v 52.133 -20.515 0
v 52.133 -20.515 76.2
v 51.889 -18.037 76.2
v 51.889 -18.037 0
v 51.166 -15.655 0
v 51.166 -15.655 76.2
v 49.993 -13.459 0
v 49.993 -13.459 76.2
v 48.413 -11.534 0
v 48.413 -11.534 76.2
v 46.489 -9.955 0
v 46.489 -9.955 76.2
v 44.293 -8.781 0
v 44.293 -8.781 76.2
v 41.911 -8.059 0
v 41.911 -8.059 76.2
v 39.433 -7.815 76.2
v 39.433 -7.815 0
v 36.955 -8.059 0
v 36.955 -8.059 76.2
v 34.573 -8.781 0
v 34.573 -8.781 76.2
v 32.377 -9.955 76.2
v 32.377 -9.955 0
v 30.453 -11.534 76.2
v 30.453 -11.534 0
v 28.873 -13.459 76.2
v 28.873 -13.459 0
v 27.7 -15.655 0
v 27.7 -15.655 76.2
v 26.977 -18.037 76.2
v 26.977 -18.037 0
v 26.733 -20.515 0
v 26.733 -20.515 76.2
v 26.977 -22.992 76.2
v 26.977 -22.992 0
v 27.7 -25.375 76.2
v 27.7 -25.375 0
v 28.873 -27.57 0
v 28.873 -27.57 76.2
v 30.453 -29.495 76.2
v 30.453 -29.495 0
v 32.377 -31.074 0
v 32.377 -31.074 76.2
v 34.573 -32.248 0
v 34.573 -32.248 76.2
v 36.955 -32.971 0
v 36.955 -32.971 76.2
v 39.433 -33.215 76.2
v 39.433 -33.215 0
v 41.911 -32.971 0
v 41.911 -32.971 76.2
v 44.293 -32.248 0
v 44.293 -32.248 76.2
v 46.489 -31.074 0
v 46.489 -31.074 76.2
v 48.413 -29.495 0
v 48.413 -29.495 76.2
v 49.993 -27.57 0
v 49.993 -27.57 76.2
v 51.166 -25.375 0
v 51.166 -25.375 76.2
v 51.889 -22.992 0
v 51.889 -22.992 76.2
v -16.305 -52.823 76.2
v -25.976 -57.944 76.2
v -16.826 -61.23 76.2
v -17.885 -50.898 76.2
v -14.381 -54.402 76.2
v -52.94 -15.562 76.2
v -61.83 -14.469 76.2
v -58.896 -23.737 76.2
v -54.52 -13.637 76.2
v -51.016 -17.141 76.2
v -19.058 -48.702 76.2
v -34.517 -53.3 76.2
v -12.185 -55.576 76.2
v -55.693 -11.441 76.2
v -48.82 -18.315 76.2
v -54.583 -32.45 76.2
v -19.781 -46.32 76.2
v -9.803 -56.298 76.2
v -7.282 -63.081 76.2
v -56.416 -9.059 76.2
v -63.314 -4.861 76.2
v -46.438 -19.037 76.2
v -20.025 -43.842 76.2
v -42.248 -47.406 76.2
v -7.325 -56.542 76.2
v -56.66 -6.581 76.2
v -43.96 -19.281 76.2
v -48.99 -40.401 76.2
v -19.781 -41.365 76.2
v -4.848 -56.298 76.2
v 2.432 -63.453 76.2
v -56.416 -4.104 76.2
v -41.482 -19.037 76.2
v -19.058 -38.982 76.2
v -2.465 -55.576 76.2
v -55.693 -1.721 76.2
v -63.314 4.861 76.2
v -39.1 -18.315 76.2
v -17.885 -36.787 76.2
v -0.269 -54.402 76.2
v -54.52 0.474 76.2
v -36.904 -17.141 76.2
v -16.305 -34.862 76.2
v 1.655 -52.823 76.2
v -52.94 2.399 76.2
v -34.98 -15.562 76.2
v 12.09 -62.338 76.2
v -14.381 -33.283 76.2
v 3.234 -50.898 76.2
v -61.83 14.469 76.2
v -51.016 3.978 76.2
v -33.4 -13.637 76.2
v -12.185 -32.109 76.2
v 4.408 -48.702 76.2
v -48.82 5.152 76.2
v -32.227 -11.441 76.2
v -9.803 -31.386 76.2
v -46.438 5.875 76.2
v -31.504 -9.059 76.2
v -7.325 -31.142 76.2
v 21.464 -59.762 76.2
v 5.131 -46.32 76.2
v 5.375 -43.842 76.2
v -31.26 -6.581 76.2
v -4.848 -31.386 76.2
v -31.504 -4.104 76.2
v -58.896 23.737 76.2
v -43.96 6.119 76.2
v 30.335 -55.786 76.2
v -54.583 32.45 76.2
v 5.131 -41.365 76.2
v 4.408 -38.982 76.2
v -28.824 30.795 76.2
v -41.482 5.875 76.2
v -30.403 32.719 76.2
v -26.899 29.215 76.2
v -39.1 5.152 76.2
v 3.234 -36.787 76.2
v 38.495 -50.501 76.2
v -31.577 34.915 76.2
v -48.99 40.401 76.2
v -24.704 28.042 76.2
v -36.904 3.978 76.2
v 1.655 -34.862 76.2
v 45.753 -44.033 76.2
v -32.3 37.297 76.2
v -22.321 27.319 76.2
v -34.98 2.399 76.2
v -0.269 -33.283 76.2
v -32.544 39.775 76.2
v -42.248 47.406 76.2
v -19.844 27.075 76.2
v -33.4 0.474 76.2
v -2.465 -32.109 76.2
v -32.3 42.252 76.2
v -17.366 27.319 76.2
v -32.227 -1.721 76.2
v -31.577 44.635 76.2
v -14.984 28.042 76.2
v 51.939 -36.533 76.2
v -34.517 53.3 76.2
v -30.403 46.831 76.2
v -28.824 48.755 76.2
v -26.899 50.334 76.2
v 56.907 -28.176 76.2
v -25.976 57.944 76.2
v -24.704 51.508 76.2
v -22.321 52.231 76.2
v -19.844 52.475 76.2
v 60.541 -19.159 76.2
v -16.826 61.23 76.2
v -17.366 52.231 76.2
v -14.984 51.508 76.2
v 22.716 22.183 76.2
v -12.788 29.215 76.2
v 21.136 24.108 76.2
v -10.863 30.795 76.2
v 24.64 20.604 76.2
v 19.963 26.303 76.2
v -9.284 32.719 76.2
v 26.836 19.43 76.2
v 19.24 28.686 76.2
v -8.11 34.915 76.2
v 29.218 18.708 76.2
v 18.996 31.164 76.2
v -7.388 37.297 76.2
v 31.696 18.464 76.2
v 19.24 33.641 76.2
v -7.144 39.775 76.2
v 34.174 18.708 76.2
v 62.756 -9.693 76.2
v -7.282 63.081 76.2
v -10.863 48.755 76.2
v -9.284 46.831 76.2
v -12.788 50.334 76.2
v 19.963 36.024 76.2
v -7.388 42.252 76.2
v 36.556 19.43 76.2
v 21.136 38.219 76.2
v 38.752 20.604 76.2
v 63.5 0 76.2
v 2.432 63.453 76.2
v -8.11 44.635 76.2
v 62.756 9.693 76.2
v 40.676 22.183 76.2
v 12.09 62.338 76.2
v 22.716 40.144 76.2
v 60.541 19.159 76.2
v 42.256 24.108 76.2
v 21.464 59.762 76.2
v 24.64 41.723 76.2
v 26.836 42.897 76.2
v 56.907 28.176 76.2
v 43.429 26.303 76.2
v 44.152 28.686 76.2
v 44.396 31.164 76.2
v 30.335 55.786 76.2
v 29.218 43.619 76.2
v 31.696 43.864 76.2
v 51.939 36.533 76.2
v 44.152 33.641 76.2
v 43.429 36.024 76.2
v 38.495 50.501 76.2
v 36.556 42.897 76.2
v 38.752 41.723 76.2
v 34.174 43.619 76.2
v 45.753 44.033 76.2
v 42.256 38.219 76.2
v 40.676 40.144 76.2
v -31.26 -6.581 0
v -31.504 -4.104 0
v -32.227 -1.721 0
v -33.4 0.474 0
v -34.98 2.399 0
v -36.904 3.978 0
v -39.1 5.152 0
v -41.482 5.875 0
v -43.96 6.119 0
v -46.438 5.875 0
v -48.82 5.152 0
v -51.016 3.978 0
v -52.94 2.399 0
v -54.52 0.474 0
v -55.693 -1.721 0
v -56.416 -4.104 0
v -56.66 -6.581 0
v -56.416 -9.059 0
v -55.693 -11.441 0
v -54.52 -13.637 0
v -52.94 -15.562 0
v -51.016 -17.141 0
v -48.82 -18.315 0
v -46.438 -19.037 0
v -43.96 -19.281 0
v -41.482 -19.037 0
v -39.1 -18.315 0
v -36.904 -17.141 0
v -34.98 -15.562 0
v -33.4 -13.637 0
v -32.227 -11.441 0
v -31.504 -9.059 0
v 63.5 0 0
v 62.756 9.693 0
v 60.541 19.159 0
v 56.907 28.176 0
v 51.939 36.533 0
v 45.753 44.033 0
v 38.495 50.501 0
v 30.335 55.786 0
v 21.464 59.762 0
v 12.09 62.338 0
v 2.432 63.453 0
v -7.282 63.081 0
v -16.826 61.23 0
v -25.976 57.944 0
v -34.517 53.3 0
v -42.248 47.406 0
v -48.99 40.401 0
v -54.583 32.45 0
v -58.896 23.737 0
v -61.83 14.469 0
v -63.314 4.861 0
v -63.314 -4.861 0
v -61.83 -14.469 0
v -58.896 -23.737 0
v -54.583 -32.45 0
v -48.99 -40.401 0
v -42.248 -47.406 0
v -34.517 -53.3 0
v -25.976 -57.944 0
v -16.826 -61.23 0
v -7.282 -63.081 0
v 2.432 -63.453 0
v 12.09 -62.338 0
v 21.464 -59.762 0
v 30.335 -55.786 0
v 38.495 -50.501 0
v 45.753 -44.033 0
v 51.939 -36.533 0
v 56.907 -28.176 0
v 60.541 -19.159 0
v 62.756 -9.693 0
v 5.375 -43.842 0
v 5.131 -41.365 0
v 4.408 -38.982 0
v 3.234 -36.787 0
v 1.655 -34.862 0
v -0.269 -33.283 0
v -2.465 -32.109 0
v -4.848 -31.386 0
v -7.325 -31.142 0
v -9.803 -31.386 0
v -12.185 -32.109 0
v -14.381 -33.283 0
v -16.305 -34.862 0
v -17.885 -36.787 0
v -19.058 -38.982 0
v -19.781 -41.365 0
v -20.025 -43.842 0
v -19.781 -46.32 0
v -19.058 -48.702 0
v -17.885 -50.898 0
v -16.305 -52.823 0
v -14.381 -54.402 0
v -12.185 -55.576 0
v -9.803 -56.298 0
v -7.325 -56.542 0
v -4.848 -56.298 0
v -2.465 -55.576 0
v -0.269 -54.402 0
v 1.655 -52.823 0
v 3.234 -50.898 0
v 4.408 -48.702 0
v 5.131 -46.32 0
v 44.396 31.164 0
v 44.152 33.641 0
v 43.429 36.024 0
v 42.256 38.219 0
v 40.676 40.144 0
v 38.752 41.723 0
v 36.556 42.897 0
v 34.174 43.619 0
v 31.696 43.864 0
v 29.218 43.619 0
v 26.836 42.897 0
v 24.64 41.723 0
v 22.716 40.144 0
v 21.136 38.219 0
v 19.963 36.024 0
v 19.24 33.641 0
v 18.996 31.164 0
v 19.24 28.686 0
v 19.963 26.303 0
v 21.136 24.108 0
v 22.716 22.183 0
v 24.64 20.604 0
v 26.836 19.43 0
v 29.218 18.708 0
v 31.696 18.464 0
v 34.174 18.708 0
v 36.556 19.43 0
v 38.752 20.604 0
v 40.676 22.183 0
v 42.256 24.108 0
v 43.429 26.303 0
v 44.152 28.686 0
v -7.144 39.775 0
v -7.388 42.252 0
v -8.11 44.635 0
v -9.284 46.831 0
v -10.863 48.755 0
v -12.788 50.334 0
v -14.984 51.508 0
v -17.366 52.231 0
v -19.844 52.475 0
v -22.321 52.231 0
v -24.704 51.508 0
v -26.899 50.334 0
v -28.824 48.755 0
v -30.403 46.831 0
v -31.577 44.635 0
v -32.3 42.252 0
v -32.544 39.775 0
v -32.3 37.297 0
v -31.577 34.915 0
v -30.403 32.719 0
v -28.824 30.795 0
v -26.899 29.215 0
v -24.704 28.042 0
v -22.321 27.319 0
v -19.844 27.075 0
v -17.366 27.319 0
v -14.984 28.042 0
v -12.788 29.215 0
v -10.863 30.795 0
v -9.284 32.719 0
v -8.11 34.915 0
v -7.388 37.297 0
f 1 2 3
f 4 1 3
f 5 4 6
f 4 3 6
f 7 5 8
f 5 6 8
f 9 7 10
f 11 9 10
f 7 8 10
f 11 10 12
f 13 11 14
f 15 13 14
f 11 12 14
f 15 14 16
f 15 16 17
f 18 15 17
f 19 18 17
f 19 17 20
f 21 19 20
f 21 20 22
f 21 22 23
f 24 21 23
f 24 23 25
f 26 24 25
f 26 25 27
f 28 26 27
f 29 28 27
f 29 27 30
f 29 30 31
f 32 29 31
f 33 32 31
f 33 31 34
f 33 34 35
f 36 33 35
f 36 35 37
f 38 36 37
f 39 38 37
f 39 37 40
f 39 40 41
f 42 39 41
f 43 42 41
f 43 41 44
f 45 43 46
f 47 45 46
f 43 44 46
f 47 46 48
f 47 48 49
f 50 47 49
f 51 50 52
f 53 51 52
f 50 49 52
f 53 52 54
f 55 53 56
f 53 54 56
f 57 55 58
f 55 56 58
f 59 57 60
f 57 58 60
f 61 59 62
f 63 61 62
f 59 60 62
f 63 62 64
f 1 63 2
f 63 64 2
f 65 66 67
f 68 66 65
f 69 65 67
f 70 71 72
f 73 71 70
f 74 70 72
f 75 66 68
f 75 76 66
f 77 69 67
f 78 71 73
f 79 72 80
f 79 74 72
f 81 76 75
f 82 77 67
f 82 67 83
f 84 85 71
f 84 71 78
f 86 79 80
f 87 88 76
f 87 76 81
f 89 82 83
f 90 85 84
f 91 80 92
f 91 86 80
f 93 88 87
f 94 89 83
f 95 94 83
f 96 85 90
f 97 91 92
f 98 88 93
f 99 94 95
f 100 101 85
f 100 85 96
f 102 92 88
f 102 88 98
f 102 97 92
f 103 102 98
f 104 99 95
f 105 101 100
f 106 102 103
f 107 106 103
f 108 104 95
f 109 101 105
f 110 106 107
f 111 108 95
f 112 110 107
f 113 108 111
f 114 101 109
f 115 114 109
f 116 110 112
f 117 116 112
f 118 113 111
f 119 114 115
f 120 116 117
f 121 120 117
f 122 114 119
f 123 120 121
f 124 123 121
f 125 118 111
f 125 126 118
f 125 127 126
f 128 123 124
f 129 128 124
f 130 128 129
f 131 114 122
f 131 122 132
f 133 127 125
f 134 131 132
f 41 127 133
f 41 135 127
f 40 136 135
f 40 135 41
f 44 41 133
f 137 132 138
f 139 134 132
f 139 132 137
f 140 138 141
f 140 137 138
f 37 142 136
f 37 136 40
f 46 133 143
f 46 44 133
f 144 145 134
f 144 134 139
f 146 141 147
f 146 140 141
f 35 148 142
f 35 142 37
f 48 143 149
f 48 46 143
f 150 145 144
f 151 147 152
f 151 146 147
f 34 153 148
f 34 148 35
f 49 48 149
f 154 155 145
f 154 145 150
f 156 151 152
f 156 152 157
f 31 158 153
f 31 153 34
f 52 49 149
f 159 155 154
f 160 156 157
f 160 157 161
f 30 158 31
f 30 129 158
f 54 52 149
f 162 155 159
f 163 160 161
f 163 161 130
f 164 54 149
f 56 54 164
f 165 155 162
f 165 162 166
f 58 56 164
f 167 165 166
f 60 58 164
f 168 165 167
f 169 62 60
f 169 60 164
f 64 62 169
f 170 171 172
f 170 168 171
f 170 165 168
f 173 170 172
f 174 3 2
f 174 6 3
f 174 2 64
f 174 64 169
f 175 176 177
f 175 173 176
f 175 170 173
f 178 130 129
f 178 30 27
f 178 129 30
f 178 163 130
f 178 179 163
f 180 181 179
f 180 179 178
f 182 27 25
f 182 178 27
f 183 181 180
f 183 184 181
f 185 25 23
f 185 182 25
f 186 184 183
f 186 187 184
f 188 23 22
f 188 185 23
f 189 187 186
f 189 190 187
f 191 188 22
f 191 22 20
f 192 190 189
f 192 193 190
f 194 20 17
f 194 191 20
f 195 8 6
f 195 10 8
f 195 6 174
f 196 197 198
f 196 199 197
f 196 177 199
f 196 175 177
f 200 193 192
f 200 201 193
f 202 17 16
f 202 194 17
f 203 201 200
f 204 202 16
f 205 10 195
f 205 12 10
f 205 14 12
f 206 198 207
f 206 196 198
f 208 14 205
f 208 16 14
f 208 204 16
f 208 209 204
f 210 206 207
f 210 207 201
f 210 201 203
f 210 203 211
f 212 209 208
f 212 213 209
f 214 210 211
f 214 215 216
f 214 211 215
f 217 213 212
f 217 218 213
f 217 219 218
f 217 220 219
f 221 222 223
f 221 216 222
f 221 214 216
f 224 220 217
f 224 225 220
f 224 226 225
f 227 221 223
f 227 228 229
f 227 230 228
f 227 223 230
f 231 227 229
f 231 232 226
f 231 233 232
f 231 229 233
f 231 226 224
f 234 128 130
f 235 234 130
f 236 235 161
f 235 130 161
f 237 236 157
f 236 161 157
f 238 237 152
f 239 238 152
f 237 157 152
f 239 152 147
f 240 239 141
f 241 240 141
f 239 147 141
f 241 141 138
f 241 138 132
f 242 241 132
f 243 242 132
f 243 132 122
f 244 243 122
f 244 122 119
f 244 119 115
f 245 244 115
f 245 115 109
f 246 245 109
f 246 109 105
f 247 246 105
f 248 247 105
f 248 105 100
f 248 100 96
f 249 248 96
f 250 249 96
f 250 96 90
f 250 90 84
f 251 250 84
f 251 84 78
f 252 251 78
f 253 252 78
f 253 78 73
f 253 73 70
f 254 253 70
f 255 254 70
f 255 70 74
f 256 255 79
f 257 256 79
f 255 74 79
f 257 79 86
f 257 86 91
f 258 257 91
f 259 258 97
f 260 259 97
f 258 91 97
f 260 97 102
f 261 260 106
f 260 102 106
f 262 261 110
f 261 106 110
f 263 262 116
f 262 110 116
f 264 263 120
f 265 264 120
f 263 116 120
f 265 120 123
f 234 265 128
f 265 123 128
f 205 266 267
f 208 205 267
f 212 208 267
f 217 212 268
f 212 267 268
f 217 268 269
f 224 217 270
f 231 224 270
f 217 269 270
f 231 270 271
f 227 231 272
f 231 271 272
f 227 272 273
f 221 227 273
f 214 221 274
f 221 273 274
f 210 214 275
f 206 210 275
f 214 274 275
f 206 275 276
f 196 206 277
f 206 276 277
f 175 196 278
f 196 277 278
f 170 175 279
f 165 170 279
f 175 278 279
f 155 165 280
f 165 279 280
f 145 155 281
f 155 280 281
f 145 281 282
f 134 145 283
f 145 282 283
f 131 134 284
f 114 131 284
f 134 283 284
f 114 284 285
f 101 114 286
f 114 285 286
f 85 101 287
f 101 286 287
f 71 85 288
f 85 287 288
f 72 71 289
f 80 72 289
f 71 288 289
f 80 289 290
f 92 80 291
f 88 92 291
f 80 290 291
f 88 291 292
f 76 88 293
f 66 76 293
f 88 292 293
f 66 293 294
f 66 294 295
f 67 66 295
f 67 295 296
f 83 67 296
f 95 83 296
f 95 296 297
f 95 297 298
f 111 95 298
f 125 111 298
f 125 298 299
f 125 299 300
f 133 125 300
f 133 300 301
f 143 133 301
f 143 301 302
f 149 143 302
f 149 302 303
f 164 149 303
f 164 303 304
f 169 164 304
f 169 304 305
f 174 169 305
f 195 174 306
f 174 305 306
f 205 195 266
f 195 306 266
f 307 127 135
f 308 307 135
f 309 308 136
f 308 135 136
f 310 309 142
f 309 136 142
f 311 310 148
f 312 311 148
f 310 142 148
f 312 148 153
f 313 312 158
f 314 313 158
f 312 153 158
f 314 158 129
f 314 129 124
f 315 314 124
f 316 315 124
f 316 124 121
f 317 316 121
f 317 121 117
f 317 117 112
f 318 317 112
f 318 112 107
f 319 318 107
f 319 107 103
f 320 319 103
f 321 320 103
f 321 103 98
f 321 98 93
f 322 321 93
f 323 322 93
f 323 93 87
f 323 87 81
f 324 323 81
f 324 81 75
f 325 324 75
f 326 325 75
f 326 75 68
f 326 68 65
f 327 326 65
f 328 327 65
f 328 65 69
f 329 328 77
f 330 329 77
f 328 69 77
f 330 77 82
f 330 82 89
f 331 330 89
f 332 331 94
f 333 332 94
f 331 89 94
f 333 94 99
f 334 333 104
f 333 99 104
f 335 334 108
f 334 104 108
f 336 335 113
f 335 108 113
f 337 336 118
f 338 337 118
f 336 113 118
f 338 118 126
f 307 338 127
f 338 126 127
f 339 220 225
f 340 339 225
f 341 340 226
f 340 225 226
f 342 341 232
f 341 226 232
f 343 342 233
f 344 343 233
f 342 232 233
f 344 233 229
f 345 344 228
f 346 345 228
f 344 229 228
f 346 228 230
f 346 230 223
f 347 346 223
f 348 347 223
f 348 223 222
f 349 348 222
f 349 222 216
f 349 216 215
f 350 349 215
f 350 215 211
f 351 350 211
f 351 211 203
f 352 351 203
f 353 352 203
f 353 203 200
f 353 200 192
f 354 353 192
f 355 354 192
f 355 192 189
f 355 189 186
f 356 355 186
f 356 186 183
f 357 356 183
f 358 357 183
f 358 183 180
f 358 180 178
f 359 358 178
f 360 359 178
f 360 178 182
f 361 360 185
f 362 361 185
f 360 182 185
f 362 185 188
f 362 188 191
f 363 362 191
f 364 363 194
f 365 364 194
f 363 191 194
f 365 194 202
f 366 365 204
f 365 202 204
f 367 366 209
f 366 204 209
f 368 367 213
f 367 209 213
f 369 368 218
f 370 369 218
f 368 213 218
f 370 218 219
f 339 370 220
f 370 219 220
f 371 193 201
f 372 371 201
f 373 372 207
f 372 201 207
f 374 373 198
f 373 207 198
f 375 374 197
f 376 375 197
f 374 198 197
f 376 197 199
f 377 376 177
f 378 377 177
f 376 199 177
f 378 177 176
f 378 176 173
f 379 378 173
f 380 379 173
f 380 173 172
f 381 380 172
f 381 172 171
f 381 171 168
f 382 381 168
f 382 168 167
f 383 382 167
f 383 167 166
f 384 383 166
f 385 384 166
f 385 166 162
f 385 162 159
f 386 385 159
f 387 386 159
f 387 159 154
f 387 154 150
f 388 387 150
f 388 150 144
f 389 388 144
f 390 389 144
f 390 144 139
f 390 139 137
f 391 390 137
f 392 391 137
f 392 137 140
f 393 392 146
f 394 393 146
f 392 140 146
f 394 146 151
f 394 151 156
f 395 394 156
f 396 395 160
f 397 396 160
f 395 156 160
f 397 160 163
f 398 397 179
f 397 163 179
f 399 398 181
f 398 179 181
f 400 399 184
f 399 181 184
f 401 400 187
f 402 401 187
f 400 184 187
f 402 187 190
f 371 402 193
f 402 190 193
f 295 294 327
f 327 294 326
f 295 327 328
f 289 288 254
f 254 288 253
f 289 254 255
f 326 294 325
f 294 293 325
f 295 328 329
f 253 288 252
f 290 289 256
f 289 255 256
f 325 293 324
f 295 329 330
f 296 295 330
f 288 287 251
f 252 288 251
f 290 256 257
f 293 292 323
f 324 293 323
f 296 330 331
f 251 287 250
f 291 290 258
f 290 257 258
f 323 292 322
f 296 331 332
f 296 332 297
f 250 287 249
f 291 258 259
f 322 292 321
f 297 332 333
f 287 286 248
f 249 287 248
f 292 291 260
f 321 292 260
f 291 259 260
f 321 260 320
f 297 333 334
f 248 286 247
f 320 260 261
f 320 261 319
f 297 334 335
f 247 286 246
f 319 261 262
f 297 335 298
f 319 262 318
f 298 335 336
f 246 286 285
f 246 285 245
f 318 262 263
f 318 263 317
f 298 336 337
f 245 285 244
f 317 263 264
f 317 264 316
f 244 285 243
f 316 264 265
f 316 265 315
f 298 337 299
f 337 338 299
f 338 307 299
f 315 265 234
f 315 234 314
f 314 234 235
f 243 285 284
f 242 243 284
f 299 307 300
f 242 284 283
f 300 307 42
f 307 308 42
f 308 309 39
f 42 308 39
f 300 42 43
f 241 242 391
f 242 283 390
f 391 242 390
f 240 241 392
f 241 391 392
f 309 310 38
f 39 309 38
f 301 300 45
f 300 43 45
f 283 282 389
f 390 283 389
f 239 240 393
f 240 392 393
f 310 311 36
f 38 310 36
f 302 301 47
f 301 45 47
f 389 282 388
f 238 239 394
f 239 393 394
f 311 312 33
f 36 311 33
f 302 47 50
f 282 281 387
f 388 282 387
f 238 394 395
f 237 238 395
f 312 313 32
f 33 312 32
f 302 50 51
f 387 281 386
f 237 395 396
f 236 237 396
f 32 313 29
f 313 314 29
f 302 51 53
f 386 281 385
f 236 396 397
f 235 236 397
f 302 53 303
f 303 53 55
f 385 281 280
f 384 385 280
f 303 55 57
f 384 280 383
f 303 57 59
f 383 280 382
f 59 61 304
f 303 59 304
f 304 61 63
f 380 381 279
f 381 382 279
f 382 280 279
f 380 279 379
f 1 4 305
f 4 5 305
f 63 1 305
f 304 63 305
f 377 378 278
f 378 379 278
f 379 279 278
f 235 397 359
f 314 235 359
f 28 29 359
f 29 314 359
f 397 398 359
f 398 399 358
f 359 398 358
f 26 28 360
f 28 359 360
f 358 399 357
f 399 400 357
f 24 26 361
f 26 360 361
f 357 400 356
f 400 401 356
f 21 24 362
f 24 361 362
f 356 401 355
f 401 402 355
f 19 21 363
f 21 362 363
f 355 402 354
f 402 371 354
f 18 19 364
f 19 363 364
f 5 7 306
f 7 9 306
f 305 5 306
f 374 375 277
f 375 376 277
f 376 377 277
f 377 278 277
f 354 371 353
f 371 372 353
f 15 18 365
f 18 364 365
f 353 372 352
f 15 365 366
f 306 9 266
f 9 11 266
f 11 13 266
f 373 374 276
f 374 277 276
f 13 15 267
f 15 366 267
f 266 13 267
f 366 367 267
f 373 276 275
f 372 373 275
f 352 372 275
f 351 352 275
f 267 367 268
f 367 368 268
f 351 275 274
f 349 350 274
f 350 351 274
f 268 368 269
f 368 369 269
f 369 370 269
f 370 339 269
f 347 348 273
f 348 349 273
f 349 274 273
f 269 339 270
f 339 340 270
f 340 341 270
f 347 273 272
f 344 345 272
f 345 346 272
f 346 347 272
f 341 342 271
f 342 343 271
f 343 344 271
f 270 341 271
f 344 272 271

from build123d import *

# Parameters (mm, degrees)
F0_R     = 63.5
F1_DEPTH = 76.2
F2_R     = 12.7
F3_DEPTH = 76.201


with BuildPart() as f1:
    # F0 (on Top) → F1 (new body)
    with BuildSketch(Plane.XY):
        Circle(F0_R)
    extrude(amount=F1_DEPTH)

    # F2 (on face) → F3 (cut, through all)
    with BuildSketch(Plane.XY.offset(76.2)):
        with Locations((-19.843639245, 39.7747719229)):
            Circle(F2_R)
        with Locations((31.6960342644, 31.1635028825)):
            Circle(F2_R)
        with Locations((39.432865729, -20.514667933)):
            Circle(F2_R)
        with Locations((-7.3251829701, -43.842264933)):
            Circle(F2_R)
        with Locations((-43.9600777783, -6.5813419394)):
            Circle(F2_R)
    extrude(amount=-F3_DEPTH, mode=Mode.SUBTRACT)


solid = f1.part
